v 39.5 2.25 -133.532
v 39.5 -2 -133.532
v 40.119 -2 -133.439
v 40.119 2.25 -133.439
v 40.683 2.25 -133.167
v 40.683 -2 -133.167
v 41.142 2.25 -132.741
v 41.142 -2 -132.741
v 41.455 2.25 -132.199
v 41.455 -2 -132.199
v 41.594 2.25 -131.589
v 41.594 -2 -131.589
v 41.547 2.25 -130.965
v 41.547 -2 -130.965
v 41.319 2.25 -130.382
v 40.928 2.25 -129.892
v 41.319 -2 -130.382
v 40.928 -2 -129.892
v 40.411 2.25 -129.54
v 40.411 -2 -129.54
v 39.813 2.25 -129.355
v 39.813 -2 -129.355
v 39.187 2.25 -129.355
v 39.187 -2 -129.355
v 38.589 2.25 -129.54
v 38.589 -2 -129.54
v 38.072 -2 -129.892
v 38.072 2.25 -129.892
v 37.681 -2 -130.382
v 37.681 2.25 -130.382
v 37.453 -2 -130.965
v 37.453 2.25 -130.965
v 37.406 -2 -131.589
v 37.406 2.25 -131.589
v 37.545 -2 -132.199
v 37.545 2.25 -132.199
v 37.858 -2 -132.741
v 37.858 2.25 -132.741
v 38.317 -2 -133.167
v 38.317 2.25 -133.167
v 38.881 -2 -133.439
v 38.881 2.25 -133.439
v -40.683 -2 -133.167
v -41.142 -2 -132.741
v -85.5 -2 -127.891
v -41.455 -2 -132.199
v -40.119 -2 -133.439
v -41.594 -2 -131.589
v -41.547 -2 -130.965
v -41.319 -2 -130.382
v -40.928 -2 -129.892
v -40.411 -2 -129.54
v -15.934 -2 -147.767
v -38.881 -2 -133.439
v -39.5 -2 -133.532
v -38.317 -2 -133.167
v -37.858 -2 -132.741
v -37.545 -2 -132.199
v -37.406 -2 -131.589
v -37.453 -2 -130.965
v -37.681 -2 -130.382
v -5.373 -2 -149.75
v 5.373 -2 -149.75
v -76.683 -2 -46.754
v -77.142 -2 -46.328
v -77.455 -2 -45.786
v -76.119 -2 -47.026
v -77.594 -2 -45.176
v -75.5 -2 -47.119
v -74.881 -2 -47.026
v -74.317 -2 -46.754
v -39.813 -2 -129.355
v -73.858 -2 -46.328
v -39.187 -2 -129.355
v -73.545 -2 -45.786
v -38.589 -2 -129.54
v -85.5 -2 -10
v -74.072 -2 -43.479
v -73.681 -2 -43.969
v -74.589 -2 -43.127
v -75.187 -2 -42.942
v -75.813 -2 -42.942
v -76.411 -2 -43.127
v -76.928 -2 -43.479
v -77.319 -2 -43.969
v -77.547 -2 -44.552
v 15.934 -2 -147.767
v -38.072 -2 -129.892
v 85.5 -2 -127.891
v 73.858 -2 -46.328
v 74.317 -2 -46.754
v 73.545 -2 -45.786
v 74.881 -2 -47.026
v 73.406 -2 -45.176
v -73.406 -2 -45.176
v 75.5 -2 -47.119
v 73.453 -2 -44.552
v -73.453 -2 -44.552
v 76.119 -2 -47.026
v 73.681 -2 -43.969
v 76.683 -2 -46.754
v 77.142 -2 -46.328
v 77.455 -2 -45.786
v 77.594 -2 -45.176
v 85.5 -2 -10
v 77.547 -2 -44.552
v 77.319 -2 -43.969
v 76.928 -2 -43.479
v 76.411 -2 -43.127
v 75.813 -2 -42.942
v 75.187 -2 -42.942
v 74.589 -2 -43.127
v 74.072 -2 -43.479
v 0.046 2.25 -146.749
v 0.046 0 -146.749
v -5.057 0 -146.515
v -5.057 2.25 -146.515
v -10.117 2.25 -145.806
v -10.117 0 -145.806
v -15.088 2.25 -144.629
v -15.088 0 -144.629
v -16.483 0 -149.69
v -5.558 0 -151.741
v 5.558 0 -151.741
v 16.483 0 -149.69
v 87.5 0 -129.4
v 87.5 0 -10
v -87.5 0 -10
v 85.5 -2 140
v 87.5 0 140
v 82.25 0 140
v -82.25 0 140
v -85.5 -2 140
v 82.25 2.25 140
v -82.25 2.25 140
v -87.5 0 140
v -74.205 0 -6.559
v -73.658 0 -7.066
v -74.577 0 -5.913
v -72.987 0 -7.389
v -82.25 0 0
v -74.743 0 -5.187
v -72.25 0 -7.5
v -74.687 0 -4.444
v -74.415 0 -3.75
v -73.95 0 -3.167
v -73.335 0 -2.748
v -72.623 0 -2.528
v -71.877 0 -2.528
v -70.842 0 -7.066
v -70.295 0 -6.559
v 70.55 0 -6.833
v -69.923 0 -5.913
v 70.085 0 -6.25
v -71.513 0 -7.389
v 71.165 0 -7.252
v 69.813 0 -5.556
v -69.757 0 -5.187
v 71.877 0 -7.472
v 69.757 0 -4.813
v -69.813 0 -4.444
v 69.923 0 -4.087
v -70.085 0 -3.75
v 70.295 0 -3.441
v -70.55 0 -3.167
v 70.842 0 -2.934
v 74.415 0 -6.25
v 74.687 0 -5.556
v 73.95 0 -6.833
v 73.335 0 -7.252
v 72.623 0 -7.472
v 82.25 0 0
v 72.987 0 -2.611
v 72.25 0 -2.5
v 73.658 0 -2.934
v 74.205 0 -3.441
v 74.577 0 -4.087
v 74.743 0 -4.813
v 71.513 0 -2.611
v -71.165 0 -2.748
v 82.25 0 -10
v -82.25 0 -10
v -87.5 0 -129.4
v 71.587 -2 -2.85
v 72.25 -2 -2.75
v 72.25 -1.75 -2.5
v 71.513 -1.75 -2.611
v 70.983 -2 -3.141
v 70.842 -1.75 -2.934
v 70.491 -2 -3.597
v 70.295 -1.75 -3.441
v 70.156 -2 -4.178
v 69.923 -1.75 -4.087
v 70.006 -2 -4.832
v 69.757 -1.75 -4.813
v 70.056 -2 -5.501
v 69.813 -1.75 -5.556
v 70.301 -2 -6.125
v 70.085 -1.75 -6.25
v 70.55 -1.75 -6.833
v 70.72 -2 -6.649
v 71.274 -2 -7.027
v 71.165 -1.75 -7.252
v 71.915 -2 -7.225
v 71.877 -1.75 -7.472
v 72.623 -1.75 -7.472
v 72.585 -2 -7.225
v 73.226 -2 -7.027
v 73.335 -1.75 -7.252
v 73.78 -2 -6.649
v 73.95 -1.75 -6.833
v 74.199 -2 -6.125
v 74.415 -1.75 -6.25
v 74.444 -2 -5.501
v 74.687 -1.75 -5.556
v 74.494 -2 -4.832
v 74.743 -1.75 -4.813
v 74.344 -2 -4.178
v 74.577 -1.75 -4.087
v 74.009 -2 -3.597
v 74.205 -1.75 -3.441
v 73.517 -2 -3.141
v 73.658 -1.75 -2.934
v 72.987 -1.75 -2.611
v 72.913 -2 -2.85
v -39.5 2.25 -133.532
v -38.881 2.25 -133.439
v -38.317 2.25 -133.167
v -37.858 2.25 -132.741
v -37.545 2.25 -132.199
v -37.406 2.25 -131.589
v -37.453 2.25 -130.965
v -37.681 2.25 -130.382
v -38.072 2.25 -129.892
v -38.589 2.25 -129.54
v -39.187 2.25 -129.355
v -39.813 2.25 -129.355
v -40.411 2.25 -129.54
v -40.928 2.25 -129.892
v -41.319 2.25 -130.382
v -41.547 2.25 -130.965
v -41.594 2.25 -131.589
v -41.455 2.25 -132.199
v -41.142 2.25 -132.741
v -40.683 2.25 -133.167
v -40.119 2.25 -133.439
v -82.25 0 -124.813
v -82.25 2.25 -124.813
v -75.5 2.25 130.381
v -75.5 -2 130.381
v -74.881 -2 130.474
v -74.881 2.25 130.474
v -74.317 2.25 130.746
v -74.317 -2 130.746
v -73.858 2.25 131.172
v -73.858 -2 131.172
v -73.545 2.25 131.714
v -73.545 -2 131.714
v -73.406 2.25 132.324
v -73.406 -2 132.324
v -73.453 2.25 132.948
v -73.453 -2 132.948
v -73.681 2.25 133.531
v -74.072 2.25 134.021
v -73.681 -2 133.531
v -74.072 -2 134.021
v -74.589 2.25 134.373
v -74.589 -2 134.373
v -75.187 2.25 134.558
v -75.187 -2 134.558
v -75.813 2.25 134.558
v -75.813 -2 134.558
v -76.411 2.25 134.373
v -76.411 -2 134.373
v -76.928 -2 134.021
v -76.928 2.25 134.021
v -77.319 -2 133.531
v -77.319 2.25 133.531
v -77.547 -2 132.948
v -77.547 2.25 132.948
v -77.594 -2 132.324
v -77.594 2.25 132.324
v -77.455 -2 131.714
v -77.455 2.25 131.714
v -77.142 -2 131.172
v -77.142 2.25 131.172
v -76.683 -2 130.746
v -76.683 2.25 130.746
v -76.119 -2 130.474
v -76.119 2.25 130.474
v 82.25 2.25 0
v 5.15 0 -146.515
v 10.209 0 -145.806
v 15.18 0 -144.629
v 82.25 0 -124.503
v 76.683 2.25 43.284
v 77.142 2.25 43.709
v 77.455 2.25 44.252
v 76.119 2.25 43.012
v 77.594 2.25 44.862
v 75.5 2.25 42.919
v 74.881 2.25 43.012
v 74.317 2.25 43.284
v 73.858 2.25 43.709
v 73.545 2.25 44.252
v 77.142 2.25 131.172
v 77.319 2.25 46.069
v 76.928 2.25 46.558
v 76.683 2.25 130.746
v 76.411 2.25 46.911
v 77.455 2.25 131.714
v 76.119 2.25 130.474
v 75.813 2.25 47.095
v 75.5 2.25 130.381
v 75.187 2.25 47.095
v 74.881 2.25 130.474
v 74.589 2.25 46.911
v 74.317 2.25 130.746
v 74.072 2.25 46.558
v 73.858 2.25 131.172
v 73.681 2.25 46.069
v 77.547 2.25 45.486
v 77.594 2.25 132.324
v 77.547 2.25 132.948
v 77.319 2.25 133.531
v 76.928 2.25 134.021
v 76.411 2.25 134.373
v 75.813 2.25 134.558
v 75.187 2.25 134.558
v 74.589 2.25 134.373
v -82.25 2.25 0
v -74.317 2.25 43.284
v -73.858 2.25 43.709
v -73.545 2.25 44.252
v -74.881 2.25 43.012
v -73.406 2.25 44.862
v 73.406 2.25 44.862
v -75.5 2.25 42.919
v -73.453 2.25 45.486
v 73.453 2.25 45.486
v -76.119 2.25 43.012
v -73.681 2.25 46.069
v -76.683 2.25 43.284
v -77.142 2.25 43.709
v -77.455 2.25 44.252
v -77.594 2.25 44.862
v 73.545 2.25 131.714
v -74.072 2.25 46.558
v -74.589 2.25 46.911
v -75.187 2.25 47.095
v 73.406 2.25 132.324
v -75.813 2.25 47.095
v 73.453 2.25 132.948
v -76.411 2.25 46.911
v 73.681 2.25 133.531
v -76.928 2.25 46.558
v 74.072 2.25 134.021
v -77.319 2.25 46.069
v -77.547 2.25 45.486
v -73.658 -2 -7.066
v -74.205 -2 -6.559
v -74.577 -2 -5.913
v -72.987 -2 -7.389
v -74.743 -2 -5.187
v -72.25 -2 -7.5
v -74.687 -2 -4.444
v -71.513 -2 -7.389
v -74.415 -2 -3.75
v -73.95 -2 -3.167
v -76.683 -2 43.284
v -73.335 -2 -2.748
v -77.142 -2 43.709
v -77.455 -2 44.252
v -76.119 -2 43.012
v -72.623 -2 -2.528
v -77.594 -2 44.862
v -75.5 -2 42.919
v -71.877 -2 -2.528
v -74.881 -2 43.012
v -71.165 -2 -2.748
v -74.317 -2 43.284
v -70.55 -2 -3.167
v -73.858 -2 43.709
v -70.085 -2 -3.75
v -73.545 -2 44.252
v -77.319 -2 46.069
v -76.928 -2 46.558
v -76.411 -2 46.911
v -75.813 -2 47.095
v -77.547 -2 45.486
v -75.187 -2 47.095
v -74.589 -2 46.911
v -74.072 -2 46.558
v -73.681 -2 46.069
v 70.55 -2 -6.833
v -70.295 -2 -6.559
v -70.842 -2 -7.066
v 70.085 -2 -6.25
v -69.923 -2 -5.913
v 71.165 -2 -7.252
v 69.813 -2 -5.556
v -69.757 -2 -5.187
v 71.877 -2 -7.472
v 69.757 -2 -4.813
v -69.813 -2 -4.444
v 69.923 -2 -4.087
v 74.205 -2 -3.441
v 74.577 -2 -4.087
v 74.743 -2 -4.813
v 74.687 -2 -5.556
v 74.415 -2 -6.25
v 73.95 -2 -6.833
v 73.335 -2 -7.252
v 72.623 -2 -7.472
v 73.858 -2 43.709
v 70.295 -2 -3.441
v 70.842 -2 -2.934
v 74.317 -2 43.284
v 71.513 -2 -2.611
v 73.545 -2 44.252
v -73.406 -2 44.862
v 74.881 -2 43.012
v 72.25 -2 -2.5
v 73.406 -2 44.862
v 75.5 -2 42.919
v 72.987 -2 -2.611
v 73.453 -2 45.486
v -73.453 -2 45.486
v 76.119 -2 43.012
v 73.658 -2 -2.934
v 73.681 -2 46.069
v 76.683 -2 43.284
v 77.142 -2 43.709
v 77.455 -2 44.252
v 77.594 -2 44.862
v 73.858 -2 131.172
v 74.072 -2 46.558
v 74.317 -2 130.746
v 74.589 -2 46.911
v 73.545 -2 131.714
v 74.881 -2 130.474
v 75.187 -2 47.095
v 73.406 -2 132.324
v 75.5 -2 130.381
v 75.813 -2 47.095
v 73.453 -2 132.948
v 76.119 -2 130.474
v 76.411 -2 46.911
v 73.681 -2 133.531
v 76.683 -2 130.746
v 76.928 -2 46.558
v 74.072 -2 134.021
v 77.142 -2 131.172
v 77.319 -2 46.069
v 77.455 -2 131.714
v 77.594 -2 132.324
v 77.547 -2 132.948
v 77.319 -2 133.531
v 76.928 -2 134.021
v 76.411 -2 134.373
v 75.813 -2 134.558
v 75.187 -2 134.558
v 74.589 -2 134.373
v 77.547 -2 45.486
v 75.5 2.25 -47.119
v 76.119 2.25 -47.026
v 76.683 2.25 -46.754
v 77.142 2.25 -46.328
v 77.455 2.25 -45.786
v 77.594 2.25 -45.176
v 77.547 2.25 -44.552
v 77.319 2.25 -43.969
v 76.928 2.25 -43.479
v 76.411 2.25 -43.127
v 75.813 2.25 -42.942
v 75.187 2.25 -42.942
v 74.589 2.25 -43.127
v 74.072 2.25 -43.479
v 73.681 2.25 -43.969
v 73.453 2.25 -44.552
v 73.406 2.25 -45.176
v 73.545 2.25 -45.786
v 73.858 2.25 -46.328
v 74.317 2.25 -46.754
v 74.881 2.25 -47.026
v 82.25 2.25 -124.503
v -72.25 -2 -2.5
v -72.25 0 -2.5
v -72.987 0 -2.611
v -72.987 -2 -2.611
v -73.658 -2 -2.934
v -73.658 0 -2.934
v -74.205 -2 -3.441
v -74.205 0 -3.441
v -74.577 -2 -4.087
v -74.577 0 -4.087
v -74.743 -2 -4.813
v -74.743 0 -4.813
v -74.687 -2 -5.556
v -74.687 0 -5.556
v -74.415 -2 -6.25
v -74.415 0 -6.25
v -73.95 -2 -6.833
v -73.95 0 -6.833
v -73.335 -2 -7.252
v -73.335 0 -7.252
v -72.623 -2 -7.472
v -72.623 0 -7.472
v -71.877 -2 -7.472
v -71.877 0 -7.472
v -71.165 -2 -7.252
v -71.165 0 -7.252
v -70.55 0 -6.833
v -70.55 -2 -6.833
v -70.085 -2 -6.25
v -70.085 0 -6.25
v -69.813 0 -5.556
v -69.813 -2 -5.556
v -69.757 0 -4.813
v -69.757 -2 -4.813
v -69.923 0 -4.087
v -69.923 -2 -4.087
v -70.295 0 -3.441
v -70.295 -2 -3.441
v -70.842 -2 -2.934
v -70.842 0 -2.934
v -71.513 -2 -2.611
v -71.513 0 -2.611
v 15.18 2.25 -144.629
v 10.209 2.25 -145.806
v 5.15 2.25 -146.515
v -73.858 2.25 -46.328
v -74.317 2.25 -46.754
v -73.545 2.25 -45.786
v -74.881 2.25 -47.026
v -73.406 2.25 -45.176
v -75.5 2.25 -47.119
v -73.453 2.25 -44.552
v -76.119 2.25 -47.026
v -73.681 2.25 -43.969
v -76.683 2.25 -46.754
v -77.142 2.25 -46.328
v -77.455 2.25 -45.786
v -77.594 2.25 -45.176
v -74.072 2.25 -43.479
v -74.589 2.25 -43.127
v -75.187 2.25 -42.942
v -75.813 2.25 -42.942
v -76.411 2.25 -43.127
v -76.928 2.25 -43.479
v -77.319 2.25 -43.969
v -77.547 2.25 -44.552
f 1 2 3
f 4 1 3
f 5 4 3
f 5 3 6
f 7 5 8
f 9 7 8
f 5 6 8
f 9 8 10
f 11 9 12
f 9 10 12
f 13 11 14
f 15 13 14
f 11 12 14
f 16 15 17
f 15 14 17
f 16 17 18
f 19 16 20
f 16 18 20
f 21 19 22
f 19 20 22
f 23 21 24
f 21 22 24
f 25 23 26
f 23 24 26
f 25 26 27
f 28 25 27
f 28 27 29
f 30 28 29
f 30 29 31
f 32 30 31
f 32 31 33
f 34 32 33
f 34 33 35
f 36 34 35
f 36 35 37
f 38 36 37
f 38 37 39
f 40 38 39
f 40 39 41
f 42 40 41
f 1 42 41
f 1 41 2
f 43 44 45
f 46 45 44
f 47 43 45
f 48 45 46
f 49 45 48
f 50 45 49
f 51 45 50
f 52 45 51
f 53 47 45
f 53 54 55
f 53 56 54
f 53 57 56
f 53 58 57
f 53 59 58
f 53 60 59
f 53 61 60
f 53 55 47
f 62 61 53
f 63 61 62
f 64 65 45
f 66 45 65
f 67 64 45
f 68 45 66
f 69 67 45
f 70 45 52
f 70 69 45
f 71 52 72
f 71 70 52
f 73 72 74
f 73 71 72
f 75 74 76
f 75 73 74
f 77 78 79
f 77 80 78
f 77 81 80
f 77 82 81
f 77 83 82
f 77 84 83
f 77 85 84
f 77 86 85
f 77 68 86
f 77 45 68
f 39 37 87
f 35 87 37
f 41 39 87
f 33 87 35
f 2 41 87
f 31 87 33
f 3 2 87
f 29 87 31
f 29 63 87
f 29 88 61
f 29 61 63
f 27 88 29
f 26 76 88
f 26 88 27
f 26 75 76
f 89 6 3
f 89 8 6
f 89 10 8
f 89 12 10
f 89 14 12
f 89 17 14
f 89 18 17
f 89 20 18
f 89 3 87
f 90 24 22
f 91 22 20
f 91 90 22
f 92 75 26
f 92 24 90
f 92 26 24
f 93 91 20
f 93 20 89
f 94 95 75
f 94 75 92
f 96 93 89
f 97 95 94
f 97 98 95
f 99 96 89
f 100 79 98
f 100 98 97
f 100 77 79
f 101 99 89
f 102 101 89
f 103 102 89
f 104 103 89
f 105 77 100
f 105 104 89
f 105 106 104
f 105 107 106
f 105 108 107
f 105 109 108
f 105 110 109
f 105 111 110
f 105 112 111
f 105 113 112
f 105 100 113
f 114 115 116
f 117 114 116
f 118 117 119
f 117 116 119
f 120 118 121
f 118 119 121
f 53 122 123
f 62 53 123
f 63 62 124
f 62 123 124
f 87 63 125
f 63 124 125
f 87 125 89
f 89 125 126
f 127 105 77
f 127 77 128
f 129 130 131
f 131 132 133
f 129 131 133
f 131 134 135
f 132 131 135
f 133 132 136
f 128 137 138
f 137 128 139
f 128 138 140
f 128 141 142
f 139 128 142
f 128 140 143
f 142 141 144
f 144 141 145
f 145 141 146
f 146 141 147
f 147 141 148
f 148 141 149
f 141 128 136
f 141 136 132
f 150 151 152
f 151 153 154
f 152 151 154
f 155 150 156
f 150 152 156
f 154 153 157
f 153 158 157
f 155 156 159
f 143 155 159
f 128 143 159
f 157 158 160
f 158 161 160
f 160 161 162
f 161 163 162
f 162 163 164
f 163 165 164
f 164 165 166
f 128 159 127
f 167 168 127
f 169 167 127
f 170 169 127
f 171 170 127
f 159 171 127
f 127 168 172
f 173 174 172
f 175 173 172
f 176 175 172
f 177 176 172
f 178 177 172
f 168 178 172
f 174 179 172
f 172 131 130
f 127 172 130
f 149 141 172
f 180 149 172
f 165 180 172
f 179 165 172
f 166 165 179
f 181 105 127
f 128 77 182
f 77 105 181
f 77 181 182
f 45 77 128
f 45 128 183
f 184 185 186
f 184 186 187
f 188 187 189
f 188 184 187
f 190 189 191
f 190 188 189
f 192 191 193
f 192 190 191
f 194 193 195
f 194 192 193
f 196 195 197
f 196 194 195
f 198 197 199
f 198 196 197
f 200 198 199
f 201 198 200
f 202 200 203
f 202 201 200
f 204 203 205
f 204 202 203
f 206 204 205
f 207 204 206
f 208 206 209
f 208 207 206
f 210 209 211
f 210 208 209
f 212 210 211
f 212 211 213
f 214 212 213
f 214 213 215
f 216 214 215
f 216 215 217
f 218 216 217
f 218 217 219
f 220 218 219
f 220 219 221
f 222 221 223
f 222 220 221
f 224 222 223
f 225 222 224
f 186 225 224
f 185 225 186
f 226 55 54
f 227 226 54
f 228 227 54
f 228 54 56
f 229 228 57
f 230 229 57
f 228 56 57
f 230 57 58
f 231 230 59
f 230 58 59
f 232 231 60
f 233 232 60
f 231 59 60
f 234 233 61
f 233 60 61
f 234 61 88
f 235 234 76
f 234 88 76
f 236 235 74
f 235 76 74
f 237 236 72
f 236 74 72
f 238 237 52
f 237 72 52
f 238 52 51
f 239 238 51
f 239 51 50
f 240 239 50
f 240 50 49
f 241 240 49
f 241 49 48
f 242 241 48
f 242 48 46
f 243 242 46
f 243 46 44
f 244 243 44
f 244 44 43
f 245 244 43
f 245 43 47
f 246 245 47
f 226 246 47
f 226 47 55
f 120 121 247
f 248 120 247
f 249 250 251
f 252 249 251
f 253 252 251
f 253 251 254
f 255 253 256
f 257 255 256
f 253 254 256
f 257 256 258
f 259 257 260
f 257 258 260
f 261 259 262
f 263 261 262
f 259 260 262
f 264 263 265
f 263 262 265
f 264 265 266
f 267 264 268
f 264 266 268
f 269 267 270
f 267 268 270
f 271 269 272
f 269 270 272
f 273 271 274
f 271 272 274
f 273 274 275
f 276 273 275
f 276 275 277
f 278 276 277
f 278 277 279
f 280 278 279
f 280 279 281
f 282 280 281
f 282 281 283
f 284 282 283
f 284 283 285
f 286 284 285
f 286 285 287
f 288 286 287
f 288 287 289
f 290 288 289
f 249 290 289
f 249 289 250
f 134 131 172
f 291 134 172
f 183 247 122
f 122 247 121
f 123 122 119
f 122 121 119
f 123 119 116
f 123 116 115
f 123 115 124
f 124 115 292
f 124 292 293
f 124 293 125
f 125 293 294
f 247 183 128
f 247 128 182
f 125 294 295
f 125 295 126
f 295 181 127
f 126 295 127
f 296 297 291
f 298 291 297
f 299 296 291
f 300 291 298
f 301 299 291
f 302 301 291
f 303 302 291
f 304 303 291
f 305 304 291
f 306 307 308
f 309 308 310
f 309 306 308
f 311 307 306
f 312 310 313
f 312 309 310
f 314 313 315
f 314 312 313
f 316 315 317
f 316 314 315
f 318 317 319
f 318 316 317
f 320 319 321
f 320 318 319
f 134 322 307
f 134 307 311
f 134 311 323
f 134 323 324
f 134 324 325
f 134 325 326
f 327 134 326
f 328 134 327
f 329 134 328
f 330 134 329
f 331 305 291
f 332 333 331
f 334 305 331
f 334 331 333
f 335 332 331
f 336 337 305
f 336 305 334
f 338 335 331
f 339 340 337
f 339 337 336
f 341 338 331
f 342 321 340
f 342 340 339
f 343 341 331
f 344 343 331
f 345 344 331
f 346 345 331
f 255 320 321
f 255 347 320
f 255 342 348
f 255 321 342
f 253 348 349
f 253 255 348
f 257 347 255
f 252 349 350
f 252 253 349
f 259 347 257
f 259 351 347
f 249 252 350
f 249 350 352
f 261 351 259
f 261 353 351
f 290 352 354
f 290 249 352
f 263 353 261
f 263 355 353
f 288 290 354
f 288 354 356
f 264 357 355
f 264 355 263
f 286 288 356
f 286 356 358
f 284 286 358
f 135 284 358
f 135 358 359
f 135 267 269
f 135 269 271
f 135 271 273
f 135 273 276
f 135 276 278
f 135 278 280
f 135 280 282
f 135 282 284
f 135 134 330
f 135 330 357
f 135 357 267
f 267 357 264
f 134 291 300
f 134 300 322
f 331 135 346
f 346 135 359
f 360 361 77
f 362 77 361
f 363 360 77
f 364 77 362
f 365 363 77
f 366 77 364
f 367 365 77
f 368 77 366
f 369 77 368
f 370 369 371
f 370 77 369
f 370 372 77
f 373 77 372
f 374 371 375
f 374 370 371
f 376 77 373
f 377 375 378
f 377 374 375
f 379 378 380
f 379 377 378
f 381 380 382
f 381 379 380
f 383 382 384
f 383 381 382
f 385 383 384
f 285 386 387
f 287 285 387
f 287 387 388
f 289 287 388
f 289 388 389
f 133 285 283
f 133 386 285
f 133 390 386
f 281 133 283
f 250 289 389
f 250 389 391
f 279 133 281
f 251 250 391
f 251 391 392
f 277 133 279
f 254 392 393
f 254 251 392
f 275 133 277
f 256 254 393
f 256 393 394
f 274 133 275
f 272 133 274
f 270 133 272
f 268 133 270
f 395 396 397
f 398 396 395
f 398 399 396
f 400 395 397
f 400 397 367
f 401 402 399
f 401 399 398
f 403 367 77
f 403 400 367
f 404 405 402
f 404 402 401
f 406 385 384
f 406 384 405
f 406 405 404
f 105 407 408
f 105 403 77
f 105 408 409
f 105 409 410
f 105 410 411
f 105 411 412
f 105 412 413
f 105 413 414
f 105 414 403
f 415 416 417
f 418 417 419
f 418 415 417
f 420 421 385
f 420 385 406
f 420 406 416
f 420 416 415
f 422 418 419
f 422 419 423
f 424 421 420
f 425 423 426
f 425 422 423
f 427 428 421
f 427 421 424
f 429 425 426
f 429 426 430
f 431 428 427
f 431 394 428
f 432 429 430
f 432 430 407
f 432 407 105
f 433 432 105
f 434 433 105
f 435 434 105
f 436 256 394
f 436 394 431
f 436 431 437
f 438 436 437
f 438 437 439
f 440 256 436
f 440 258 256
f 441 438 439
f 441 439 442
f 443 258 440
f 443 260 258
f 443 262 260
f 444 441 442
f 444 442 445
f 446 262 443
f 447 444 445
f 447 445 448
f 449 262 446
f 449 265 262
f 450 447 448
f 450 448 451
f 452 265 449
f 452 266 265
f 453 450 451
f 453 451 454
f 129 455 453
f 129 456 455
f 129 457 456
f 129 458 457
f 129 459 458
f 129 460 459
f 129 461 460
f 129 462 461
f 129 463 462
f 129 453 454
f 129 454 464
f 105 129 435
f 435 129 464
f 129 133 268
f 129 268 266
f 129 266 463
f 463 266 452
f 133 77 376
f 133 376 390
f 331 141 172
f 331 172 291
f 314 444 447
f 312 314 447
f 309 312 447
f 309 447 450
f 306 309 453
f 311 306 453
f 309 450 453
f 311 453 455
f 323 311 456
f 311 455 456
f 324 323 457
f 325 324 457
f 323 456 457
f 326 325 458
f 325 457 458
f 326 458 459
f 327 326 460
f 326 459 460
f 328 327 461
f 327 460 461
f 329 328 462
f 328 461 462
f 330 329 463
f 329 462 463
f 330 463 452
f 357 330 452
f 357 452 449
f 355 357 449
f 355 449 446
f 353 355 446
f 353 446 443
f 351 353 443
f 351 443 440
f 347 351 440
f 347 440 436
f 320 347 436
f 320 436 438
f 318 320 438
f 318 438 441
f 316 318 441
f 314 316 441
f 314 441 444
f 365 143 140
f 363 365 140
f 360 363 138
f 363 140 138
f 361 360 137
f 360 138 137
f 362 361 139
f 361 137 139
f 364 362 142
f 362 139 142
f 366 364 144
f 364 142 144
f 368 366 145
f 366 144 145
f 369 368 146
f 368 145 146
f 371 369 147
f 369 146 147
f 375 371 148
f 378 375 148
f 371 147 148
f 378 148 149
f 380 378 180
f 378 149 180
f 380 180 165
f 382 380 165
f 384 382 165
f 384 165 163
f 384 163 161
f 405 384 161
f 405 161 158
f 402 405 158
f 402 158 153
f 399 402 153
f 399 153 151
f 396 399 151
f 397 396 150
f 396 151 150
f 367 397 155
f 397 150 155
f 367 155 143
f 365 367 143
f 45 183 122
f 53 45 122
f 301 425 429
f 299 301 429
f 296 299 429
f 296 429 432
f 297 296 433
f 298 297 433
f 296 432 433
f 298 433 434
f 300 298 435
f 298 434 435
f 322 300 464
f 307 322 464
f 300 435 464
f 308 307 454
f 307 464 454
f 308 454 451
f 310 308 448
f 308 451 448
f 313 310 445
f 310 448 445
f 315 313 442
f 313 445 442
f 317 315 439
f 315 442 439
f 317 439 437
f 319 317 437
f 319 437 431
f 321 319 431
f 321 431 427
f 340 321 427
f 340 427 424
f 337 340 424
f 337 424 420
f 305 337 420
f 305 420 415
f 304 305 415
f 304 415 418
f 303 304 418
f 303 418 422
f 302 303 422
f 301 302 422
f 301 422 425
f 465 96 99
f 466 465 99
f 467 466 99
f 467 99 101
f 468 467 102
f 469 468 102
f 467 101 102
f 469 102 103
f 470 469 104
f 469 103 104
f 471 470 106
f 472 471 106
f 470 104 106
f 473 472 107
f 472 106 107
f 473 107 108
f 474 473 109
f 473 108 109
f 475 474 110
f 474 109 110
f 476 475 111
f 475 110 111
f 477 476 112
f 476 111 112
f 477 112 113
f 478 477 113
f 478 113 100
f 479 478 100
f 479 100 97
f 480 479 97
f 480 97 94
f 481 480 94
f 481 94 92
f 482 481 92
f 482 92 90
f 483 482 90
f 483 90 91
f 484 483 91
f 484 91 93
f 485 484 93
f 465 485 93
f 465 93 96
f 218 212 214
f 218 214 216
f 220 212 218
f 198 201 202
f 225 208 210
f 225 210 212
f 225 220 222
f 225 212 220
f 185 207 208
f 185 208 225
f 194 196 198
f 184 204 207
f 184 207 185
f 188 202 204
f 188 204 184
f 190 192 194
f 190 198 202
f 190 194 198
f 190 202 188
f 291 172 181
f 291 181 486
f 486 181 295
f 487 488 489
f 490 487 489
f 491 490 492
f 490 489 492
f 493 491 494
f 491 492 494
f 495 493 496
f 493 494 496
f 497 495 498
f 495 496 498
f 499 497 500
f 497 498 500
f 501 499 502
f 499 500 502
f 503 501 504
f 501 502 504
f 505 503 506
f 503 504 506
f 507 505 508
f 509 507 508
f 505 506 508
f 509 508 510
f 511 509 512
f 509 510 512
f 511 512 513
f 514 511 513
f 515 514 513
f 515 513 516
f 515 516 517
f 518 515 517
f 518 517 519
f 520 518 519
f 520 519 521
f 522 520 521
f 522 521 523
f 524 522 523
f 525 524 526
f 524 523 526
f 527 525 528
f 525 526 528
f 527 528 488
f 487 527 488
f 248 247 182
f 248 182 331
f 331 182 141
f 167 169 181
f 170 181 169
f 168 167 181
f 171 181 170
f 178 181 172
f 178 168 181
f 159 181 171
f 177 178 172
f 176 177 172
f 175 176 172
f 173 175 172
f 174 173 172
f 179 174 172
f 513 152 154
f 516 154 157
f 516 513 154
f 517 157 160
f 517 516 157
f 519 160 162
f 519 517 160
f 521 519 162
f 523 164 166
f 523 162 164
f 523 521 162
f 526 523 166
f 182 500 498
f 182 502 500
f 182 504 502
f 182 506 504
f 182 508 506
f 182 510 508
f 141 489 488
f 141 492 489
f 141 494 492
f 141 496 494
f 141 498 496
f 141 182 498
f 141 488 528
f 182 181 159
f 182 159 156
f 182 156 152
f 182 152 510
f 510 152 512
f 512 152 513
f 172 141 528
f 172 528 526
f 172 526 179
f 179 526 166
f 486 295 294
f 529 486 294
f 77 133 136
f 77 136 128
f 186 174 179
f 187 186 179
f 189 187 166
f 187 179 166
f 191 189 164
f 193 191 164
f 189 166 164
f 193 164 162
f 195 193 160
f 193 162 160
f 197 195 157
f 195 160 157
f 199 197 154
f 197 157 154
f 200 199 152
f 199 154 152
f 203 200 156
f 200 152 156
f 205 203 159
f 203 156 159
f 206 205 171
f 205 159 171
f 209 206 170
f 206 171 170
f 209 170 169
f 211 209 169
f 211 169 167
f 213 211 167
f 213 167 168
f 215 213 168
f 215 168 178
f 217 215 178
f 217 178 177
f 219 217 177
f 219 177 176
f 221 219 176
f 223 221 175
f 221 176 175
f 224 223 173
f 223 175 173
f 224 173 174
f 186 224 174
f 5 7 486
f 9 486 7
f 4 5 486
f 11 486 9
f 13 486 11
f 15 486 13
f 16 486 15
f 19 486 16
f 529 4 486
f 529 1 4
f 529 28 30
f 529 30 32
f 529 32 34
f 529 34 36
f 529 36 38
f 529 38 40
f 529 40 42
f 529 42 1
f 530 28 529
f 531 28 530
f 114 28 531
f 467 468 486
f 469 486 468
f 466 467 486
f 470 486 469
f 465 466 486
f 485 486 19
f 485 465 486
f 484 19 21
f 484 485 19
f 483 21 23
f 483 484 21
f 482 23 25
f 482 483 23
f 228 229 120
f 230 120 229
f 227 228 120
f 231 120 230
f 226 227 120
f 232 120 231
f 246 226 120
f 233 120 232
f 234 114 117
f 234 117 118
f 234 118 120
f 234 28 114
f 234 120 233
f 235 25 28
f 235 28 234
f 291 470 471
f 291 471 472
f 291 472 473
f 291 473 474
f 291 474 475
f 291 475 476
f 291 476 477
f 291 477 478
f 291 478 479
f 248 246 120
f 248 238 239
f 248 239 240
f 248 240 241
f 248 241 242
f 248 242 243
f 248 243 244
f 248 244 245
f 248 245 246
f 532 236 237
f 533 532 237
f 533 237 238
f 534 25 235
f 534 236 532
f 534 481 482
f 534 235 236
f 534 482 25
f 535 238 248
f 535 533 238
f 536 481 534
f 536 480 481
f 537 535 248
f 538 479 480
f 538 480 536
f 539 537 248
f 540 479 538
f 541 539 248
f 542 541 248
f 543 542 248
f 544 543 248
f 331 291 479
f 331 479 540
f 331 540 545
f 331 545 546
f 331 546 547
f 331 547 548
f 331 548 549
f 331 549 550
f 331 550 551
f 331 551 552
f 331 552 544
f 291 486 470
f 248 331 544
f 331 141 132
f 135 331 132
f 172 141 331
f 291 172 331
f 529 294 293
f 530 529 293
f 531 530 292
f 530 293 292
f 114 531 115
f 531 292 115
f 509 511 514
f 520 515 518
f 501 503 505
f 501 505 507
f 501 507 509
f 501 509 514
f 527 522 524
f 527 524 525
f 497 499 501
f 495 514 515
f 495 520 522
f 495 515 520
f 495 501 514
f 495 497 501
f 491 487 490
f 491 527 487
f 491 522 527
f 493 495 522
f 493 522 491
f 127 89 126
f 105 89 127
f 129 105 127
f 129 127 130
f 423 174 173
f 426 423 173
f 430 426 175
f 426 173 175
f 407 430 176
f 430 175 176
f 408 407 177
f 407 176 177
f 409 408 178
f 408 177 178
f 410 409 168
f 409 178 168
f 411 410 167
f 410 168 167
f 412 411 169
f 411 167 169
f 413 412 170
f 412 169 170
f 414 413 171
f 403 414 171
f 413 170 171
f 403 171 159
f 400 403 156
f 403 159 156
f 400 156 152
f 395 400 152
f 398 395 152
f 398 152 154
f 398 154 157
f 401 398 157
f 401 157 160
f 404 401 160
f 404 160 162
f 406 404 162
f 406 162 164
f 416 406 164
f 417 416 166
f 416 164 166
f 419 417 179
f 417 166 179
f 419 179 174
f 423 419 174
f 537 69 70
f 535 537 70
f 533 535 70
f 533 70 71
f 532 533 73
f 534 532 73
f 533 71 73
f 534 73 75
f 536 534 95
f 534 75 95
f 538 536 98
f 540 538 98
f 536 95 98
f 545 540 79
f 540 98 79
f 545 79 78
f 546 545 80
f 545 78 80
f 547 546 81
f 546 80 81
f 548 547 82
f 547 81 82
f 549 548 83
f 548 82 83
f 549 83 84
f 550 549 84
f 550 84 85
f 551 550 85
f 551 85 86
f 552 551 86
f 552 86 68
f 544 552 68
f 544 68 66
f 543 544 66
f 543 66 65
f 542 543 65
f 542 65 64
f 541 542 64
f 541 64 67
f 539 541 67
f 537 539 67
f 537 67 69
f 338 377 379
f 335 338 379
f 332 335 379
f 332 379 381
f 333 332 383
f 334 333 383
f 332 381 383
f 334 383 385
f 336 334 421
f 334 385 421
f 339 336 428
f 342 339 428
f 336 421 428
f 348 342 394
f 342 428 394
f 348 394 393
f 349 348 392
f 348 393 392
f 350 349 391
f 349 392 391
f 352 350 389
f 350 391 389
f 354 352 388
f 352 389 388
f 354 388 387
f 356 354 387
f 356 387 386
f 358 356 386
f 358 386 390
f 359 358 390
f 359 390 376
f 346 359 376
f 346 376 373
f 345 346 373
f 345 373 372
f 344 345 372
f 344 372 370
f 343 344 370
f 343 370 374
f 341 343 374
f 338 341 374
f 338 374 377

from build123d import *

# Parameters (mm, degrees)
BOSS_EXTRUDE1_DEPTH    = 2.25
BOSS_EXTRUDE2_DEPTH    = 2
CHAMFER1_SIZE          = 2
CUT_EXTRUDE1_REACH     = 177.436
SKETCH5_R              = 2.1
SPLIT1_SURFACE_1_BACK  = 341.45
SPLIT1_SURFACE_1_DEPTH = 682.9
SPLIT1_SURFACE_2_BACK  = 341.45
SPLIT1_SURFACE_2_DEPTH = 682.9
SKETCH7_R              = 2.5
BOSS_EXTRUDE3_DEPTH    = 2
CHAMFER2_SIZE          = 0.25
SKETCH9_R              = 2.5
CUT_EXTRUDE2_DEPTH     = 2


with BuildPart() as part:
    # Sketch3 → Boss-Extrude1 (new body)
    with BuildSketch(Plane.XZ):
        with BuildLine():
            Line((82.25, 140), (82.25, -124.502754064))
            Line((82.25, -124.502754064), (15.180121042, -144.629148882))
            ThreePointArc((15.180121042, -144.629148882), (7.687460253, -146.219552794), (0.046174732, -146.748803111))
            ThreePointArc((0.046174732, -146.748803111), (-7.595110788, -146.219552794), (-15.087771577, -144.629148882))
            Line((-15.087771577, -144.629148882), (-82.25, -124.813107271))
            Line((-82.25, -124.813107271), (-82.25, 140))
            Line((-82.25, 140), (82.25, 140))
        make_face()
    extrude(amount=-BOSS_EXTRUDE1_DEPTH)

    # Sketch4 → Boss-Extrude2 (add)
    with BuildSketch(Plane.XZ):
        with BuildLine():
            Line((87.5, 140), (-87.5, 140))
            Line((-87.5, 140), (-87.5, -129.399764523))
            Line((-87.5, -129.399764523), (-16.483267674, -149.690259473))
            ThreePointArc((-16.483267674, -149.690259473), (0, -151.998822615), (16.483267674, -149.690259473))
            Line((16.483267674, -149.690259473), (87.5, -129.399764523))
            Line((87.5, -129.399764523), (87.5, 140))
        make_face()
    extrude(amount=BOSS_EXTRUDE2_DEPTH)

    # Chamfer1
    chamfer1_edges = [part.edges().sort_by_distance(p)[0] for p in [
        (87.5, -2, 5.300117739),
        (51.991633837, -2, -139.545011998),
        (0, -2, -151.998822615),
        (-51.991633837, -2, -139.545011998),
        (-87.5, -2, 5.300117739),
    ]]
    chamfer(chamfer1_edges, length=CHAMFER1_SIZE - 0.0001)  # a hair under: the kernel refuses the full size

    # Sketch5 → Cut-Extrude1 (cut, up to next)
    with BuildSketch(Plane.XZ.offset(2), mode=Mode.PRIVATE) as cut_extrude1_sk1:
        with Locations(Location((39.5, -131.431881025, 0), (0, 0, 270))):
            Circle(SKETCH5_R)
    cut_extrude1_tool1 = extrude(cut_extrude1_sk1.sketch, amount=-CUT_EXTRUDE1_REACH, mode=Mode.PRIVATE) & part.part
    # Sketch5 → Cut-Extrude1 (cut, up to next)
    with BuildSketch(Plane.XZ.offset(2), mode=Mode.PRIVATE) as cut_extrude1_sk2:
        with Locations(Location((75.5, -45.018802154, 0), (0, 0, 270))):
            Circle(SKETCH5_R)
    cut_extrude1_tool2 = extrude(cut_extrude1_sk2.sketch, amount=-CUT_EXTRUDE1_REACH, mode=Mode.PRIVATE) & part.part
    # Sketch5 → Cut-Extrude1 (cut, up to next)
    with BuildSketch(Plane.XZ.offset(2), mode=Mode.PRIVATE) as cut_extrude1_sk3:
        with Locations(Location((75.5, 45.018802154, 0), (0, 0, 270))):
            Circle(SKETCH5_R)
    cut_extrude1_tool3 = extrude(cut_extrude1_sk3.sketch, amount=-CUT_EXTRUDE1_REACH, mode=Mode.PRIVATE) & part.part
    # Sketch5 → Cut-Extrude1 (cut, up to next)
    with BuildSketch(Plane.XZ.offset(2), mode=Mode.PRIVATE) as cut_extrude1_sk4:
        with Locations(Location((75.5, 132.481197846, 0), (0, 0, 270))):
            Circle(SKETCH5_R)
    cut_extrude1_tool4 = extrude(cut_extrude1_sk4.sketch, amount=-CUT_EXTRUDE1_REACH, mode=Mode.PRIVATE) & part.part
    # Sketch5 → Cut-Extrude1 (cut, up to next)
    with BuildSketch(Plane.XZ.offset(2), mode=Mode.PRIVATE) as cut_extrude1_sk5:
        with Locations(Location((-75.5, 132.481197846, 0), (0, 0, 270))):
            Circle(SKETCH5_R)
    cut_extrude1_tool5 = extrude(cut_extrude1_sk5.sketch, amount=-CUT_EXTRUDE1_REACH, mode=Mode.PRIVATE) & part.part
    # Sketch5 → Cut-Extrude1 (cut, up to next)
    with BuildSketch(Plane.XZ.offset(2), mode=Mode.PRIVATE) as cut_extrude1_sk6:
        with Locations(Location((-75.5, 45.018802154, 0), (0, 0, 270))):
            Circle(SKETCH5_R)
    cut_extrude1_tool6 = extrude(cut_extrude1_sk6.sketch, amount=-CUT_EXTRUDE1_REACH, mode=Mode.PRIVATE) & part.part
    # Sketch5 → Cut-Extrude1 (cut, up to next)
    with BuildSketch(Plane.XZ.offset(2), mode=Mode.PRIVATE) as cut_extrude1_sk7:
        with Locations(Location((-75.5, -45.018802154, 0), (0, 0, 270))):
            Circle(SKETCH5_R)
    cut_extrude1_tool7 = extrude(cut_extrude1_sk7.sketch, amount=-CUT_EXTRUDE1_REACH, mode=Mode.PRIVATE) & part.part
    # Sketch5 → Cut-Extrude1 (cut, up to next)
    with BuildSketch(Plane.XZ.offset(2), mode=Mode.PRIVATE) as cut_extrude1_sk8:
        with Locations(Location((-39.5, -131.431881025, 0), (0, 0, 270))):
            Circle(SKETCH5_R)
    cut_extrude1_tool8 = extrude(cut_extrude1_sk8.sketch, amount=-CUT_EXTRUDE1_REACH, mode=Mode.PRIVATE) & part.part
    add(cut_extrude1_tool1.solids().sort_by_distance((39.5, -2, -131.431881))[0], mode=Mode.SUBTRACT)
    add(cut_extrude1_tool2.solids().sort_by_distance((75.5, -2, -45.018802))[0], mode=Mode.SUBTRACT)
    add(cut_extrude1_tool3.solids().sort_by_distance((75.5, -2, 45.018802))[0], mode=Mode.SUBTRACT)
    add(cut_extrude1_tool4.solids().sort_by_distance((75.5, -2, 132.481198))[0], mode=Mode.SUBTRACT)
    add(cut_extrude1_tool5.solids().sort_by_distance((-75.5, -2, 132.481198))[0], mode=Mode.SUBTRACT)
    add(cut_extrude1_tool6.solids().sort_by_distance((-75.5, -2, 45.018802))[0], mode=Mode.SUBTRACT)
    add(cut_extrude1_tool7.solids().sort_by_distance((-75.5, -2, -45.018802))[0], mode=Mode.SUBTRACT)
    add(cut_extrude1_tool8.solids().sort_by_distance((-39.5, -2, -131.431881))[0], mode=Mode.SUBTRACT)


with BuildPart() as body_2:
    # Split1: the piece behind the surface
    add(part.part)
    # Split1 surface: a surface, the sketch's curves swept straight by 682.9 mm
    with BuildLine(Plane(origin=(0, 0, 0), x_dir=(0, 0, -1), z_dir=(1, 0, 0)).offset(-SPLIT1_SURFACE_1_BACK), mode=Mode.PRIVATE) as split1_surface_1_path:
        Line((10, -2), (10, 0))
        Line((10, 0), (0, 0))
        Line((0, 0), (0, 2.25))
    split1_surface_1 = Shell.extrude(split1_surface_1_path.wire(), (1 * SPLIT1_SURFACE_1_DEPTH, 0 * SPLIT1_SURFACE_1_DEPTH, 0 * SPLIT1_SURFACE_1_DEPTH))
    split(bisect_by=split1_surface_1, keep=Keep.BOTTOM)

    # Sketch7 → Boss-Extrude3 (add)
    with BuildSketch(Plane.XZ):
        with Locations(Location((72.25, -5, 0), (0, 0, 90))):
            Circle(SKETCH7_R)
        with Locations(Location((-72.25, -5, 0), (0, 0, 90))):
            Circle(SKETCH7_R)
    extrude(amount=BOSS_EXTRUDE3_DEPTH)

    # Chamfer2
    chamfer2_edges = [body_2.edges().sort_by_distance(p)[0] for p in [
        (72.25, -2, -7.5),
    ]]
    chamfer(chamfer2_edges, length=CHAMFER2_SIZE)


with BuildPart() as part_1:
    add(part.part)

    # Split1: split by a surface, the side it looks to stays
    # Split1 surface: a surface, the sketch's curves swept straight by 682.9 mm
    with BuildLine(Plane(origin=(0, 0, 0), x_dir=(0, 0, -1), z_dir=(1, 0, 0)).offset(-SPLIT1_SURFACE_2_BACK), mode=Mode.PRIVATE) as split1_surface_2_path:
        Line((10, -2), (10, 0))
        Line((10, 0), (0, 0))
        Line((0, 0), (0, 2.25))
    split1_surface_2 = Shell.extrude(split1_surface_2_path.wire(), (1 * SPLIT1_SURFACE_2_DEPTH, 0 * SPLIT1_SURFACE_2_DEPTH, 0 * SPLIT1_SURFACE_2_DEPTH))
    split(bisect_by=split1_surface_2, keep=Keep.TOP)

    # Sketch9 → Cut-Extrude2 (cut)
    with BuildSketch(Plane(origin=(0, 0, 0), x_dir=(1, 0, 0), z_dir=(0, 1, 0))):
        with Locations(Location((72.25, 5, 0), (0, 0, 270))):
            Circle(SKETCH9_R)
        with Locations(Location((-72.25, 5, 0), (0, 0, 90))):
            Circle(SKETCH9_R)
    extrude(amount=-CUT_EXTRUDE2_DEPTH, mode=Mode.SUBTRACT)


solid = Compound([body_2.part, part_1.part])
